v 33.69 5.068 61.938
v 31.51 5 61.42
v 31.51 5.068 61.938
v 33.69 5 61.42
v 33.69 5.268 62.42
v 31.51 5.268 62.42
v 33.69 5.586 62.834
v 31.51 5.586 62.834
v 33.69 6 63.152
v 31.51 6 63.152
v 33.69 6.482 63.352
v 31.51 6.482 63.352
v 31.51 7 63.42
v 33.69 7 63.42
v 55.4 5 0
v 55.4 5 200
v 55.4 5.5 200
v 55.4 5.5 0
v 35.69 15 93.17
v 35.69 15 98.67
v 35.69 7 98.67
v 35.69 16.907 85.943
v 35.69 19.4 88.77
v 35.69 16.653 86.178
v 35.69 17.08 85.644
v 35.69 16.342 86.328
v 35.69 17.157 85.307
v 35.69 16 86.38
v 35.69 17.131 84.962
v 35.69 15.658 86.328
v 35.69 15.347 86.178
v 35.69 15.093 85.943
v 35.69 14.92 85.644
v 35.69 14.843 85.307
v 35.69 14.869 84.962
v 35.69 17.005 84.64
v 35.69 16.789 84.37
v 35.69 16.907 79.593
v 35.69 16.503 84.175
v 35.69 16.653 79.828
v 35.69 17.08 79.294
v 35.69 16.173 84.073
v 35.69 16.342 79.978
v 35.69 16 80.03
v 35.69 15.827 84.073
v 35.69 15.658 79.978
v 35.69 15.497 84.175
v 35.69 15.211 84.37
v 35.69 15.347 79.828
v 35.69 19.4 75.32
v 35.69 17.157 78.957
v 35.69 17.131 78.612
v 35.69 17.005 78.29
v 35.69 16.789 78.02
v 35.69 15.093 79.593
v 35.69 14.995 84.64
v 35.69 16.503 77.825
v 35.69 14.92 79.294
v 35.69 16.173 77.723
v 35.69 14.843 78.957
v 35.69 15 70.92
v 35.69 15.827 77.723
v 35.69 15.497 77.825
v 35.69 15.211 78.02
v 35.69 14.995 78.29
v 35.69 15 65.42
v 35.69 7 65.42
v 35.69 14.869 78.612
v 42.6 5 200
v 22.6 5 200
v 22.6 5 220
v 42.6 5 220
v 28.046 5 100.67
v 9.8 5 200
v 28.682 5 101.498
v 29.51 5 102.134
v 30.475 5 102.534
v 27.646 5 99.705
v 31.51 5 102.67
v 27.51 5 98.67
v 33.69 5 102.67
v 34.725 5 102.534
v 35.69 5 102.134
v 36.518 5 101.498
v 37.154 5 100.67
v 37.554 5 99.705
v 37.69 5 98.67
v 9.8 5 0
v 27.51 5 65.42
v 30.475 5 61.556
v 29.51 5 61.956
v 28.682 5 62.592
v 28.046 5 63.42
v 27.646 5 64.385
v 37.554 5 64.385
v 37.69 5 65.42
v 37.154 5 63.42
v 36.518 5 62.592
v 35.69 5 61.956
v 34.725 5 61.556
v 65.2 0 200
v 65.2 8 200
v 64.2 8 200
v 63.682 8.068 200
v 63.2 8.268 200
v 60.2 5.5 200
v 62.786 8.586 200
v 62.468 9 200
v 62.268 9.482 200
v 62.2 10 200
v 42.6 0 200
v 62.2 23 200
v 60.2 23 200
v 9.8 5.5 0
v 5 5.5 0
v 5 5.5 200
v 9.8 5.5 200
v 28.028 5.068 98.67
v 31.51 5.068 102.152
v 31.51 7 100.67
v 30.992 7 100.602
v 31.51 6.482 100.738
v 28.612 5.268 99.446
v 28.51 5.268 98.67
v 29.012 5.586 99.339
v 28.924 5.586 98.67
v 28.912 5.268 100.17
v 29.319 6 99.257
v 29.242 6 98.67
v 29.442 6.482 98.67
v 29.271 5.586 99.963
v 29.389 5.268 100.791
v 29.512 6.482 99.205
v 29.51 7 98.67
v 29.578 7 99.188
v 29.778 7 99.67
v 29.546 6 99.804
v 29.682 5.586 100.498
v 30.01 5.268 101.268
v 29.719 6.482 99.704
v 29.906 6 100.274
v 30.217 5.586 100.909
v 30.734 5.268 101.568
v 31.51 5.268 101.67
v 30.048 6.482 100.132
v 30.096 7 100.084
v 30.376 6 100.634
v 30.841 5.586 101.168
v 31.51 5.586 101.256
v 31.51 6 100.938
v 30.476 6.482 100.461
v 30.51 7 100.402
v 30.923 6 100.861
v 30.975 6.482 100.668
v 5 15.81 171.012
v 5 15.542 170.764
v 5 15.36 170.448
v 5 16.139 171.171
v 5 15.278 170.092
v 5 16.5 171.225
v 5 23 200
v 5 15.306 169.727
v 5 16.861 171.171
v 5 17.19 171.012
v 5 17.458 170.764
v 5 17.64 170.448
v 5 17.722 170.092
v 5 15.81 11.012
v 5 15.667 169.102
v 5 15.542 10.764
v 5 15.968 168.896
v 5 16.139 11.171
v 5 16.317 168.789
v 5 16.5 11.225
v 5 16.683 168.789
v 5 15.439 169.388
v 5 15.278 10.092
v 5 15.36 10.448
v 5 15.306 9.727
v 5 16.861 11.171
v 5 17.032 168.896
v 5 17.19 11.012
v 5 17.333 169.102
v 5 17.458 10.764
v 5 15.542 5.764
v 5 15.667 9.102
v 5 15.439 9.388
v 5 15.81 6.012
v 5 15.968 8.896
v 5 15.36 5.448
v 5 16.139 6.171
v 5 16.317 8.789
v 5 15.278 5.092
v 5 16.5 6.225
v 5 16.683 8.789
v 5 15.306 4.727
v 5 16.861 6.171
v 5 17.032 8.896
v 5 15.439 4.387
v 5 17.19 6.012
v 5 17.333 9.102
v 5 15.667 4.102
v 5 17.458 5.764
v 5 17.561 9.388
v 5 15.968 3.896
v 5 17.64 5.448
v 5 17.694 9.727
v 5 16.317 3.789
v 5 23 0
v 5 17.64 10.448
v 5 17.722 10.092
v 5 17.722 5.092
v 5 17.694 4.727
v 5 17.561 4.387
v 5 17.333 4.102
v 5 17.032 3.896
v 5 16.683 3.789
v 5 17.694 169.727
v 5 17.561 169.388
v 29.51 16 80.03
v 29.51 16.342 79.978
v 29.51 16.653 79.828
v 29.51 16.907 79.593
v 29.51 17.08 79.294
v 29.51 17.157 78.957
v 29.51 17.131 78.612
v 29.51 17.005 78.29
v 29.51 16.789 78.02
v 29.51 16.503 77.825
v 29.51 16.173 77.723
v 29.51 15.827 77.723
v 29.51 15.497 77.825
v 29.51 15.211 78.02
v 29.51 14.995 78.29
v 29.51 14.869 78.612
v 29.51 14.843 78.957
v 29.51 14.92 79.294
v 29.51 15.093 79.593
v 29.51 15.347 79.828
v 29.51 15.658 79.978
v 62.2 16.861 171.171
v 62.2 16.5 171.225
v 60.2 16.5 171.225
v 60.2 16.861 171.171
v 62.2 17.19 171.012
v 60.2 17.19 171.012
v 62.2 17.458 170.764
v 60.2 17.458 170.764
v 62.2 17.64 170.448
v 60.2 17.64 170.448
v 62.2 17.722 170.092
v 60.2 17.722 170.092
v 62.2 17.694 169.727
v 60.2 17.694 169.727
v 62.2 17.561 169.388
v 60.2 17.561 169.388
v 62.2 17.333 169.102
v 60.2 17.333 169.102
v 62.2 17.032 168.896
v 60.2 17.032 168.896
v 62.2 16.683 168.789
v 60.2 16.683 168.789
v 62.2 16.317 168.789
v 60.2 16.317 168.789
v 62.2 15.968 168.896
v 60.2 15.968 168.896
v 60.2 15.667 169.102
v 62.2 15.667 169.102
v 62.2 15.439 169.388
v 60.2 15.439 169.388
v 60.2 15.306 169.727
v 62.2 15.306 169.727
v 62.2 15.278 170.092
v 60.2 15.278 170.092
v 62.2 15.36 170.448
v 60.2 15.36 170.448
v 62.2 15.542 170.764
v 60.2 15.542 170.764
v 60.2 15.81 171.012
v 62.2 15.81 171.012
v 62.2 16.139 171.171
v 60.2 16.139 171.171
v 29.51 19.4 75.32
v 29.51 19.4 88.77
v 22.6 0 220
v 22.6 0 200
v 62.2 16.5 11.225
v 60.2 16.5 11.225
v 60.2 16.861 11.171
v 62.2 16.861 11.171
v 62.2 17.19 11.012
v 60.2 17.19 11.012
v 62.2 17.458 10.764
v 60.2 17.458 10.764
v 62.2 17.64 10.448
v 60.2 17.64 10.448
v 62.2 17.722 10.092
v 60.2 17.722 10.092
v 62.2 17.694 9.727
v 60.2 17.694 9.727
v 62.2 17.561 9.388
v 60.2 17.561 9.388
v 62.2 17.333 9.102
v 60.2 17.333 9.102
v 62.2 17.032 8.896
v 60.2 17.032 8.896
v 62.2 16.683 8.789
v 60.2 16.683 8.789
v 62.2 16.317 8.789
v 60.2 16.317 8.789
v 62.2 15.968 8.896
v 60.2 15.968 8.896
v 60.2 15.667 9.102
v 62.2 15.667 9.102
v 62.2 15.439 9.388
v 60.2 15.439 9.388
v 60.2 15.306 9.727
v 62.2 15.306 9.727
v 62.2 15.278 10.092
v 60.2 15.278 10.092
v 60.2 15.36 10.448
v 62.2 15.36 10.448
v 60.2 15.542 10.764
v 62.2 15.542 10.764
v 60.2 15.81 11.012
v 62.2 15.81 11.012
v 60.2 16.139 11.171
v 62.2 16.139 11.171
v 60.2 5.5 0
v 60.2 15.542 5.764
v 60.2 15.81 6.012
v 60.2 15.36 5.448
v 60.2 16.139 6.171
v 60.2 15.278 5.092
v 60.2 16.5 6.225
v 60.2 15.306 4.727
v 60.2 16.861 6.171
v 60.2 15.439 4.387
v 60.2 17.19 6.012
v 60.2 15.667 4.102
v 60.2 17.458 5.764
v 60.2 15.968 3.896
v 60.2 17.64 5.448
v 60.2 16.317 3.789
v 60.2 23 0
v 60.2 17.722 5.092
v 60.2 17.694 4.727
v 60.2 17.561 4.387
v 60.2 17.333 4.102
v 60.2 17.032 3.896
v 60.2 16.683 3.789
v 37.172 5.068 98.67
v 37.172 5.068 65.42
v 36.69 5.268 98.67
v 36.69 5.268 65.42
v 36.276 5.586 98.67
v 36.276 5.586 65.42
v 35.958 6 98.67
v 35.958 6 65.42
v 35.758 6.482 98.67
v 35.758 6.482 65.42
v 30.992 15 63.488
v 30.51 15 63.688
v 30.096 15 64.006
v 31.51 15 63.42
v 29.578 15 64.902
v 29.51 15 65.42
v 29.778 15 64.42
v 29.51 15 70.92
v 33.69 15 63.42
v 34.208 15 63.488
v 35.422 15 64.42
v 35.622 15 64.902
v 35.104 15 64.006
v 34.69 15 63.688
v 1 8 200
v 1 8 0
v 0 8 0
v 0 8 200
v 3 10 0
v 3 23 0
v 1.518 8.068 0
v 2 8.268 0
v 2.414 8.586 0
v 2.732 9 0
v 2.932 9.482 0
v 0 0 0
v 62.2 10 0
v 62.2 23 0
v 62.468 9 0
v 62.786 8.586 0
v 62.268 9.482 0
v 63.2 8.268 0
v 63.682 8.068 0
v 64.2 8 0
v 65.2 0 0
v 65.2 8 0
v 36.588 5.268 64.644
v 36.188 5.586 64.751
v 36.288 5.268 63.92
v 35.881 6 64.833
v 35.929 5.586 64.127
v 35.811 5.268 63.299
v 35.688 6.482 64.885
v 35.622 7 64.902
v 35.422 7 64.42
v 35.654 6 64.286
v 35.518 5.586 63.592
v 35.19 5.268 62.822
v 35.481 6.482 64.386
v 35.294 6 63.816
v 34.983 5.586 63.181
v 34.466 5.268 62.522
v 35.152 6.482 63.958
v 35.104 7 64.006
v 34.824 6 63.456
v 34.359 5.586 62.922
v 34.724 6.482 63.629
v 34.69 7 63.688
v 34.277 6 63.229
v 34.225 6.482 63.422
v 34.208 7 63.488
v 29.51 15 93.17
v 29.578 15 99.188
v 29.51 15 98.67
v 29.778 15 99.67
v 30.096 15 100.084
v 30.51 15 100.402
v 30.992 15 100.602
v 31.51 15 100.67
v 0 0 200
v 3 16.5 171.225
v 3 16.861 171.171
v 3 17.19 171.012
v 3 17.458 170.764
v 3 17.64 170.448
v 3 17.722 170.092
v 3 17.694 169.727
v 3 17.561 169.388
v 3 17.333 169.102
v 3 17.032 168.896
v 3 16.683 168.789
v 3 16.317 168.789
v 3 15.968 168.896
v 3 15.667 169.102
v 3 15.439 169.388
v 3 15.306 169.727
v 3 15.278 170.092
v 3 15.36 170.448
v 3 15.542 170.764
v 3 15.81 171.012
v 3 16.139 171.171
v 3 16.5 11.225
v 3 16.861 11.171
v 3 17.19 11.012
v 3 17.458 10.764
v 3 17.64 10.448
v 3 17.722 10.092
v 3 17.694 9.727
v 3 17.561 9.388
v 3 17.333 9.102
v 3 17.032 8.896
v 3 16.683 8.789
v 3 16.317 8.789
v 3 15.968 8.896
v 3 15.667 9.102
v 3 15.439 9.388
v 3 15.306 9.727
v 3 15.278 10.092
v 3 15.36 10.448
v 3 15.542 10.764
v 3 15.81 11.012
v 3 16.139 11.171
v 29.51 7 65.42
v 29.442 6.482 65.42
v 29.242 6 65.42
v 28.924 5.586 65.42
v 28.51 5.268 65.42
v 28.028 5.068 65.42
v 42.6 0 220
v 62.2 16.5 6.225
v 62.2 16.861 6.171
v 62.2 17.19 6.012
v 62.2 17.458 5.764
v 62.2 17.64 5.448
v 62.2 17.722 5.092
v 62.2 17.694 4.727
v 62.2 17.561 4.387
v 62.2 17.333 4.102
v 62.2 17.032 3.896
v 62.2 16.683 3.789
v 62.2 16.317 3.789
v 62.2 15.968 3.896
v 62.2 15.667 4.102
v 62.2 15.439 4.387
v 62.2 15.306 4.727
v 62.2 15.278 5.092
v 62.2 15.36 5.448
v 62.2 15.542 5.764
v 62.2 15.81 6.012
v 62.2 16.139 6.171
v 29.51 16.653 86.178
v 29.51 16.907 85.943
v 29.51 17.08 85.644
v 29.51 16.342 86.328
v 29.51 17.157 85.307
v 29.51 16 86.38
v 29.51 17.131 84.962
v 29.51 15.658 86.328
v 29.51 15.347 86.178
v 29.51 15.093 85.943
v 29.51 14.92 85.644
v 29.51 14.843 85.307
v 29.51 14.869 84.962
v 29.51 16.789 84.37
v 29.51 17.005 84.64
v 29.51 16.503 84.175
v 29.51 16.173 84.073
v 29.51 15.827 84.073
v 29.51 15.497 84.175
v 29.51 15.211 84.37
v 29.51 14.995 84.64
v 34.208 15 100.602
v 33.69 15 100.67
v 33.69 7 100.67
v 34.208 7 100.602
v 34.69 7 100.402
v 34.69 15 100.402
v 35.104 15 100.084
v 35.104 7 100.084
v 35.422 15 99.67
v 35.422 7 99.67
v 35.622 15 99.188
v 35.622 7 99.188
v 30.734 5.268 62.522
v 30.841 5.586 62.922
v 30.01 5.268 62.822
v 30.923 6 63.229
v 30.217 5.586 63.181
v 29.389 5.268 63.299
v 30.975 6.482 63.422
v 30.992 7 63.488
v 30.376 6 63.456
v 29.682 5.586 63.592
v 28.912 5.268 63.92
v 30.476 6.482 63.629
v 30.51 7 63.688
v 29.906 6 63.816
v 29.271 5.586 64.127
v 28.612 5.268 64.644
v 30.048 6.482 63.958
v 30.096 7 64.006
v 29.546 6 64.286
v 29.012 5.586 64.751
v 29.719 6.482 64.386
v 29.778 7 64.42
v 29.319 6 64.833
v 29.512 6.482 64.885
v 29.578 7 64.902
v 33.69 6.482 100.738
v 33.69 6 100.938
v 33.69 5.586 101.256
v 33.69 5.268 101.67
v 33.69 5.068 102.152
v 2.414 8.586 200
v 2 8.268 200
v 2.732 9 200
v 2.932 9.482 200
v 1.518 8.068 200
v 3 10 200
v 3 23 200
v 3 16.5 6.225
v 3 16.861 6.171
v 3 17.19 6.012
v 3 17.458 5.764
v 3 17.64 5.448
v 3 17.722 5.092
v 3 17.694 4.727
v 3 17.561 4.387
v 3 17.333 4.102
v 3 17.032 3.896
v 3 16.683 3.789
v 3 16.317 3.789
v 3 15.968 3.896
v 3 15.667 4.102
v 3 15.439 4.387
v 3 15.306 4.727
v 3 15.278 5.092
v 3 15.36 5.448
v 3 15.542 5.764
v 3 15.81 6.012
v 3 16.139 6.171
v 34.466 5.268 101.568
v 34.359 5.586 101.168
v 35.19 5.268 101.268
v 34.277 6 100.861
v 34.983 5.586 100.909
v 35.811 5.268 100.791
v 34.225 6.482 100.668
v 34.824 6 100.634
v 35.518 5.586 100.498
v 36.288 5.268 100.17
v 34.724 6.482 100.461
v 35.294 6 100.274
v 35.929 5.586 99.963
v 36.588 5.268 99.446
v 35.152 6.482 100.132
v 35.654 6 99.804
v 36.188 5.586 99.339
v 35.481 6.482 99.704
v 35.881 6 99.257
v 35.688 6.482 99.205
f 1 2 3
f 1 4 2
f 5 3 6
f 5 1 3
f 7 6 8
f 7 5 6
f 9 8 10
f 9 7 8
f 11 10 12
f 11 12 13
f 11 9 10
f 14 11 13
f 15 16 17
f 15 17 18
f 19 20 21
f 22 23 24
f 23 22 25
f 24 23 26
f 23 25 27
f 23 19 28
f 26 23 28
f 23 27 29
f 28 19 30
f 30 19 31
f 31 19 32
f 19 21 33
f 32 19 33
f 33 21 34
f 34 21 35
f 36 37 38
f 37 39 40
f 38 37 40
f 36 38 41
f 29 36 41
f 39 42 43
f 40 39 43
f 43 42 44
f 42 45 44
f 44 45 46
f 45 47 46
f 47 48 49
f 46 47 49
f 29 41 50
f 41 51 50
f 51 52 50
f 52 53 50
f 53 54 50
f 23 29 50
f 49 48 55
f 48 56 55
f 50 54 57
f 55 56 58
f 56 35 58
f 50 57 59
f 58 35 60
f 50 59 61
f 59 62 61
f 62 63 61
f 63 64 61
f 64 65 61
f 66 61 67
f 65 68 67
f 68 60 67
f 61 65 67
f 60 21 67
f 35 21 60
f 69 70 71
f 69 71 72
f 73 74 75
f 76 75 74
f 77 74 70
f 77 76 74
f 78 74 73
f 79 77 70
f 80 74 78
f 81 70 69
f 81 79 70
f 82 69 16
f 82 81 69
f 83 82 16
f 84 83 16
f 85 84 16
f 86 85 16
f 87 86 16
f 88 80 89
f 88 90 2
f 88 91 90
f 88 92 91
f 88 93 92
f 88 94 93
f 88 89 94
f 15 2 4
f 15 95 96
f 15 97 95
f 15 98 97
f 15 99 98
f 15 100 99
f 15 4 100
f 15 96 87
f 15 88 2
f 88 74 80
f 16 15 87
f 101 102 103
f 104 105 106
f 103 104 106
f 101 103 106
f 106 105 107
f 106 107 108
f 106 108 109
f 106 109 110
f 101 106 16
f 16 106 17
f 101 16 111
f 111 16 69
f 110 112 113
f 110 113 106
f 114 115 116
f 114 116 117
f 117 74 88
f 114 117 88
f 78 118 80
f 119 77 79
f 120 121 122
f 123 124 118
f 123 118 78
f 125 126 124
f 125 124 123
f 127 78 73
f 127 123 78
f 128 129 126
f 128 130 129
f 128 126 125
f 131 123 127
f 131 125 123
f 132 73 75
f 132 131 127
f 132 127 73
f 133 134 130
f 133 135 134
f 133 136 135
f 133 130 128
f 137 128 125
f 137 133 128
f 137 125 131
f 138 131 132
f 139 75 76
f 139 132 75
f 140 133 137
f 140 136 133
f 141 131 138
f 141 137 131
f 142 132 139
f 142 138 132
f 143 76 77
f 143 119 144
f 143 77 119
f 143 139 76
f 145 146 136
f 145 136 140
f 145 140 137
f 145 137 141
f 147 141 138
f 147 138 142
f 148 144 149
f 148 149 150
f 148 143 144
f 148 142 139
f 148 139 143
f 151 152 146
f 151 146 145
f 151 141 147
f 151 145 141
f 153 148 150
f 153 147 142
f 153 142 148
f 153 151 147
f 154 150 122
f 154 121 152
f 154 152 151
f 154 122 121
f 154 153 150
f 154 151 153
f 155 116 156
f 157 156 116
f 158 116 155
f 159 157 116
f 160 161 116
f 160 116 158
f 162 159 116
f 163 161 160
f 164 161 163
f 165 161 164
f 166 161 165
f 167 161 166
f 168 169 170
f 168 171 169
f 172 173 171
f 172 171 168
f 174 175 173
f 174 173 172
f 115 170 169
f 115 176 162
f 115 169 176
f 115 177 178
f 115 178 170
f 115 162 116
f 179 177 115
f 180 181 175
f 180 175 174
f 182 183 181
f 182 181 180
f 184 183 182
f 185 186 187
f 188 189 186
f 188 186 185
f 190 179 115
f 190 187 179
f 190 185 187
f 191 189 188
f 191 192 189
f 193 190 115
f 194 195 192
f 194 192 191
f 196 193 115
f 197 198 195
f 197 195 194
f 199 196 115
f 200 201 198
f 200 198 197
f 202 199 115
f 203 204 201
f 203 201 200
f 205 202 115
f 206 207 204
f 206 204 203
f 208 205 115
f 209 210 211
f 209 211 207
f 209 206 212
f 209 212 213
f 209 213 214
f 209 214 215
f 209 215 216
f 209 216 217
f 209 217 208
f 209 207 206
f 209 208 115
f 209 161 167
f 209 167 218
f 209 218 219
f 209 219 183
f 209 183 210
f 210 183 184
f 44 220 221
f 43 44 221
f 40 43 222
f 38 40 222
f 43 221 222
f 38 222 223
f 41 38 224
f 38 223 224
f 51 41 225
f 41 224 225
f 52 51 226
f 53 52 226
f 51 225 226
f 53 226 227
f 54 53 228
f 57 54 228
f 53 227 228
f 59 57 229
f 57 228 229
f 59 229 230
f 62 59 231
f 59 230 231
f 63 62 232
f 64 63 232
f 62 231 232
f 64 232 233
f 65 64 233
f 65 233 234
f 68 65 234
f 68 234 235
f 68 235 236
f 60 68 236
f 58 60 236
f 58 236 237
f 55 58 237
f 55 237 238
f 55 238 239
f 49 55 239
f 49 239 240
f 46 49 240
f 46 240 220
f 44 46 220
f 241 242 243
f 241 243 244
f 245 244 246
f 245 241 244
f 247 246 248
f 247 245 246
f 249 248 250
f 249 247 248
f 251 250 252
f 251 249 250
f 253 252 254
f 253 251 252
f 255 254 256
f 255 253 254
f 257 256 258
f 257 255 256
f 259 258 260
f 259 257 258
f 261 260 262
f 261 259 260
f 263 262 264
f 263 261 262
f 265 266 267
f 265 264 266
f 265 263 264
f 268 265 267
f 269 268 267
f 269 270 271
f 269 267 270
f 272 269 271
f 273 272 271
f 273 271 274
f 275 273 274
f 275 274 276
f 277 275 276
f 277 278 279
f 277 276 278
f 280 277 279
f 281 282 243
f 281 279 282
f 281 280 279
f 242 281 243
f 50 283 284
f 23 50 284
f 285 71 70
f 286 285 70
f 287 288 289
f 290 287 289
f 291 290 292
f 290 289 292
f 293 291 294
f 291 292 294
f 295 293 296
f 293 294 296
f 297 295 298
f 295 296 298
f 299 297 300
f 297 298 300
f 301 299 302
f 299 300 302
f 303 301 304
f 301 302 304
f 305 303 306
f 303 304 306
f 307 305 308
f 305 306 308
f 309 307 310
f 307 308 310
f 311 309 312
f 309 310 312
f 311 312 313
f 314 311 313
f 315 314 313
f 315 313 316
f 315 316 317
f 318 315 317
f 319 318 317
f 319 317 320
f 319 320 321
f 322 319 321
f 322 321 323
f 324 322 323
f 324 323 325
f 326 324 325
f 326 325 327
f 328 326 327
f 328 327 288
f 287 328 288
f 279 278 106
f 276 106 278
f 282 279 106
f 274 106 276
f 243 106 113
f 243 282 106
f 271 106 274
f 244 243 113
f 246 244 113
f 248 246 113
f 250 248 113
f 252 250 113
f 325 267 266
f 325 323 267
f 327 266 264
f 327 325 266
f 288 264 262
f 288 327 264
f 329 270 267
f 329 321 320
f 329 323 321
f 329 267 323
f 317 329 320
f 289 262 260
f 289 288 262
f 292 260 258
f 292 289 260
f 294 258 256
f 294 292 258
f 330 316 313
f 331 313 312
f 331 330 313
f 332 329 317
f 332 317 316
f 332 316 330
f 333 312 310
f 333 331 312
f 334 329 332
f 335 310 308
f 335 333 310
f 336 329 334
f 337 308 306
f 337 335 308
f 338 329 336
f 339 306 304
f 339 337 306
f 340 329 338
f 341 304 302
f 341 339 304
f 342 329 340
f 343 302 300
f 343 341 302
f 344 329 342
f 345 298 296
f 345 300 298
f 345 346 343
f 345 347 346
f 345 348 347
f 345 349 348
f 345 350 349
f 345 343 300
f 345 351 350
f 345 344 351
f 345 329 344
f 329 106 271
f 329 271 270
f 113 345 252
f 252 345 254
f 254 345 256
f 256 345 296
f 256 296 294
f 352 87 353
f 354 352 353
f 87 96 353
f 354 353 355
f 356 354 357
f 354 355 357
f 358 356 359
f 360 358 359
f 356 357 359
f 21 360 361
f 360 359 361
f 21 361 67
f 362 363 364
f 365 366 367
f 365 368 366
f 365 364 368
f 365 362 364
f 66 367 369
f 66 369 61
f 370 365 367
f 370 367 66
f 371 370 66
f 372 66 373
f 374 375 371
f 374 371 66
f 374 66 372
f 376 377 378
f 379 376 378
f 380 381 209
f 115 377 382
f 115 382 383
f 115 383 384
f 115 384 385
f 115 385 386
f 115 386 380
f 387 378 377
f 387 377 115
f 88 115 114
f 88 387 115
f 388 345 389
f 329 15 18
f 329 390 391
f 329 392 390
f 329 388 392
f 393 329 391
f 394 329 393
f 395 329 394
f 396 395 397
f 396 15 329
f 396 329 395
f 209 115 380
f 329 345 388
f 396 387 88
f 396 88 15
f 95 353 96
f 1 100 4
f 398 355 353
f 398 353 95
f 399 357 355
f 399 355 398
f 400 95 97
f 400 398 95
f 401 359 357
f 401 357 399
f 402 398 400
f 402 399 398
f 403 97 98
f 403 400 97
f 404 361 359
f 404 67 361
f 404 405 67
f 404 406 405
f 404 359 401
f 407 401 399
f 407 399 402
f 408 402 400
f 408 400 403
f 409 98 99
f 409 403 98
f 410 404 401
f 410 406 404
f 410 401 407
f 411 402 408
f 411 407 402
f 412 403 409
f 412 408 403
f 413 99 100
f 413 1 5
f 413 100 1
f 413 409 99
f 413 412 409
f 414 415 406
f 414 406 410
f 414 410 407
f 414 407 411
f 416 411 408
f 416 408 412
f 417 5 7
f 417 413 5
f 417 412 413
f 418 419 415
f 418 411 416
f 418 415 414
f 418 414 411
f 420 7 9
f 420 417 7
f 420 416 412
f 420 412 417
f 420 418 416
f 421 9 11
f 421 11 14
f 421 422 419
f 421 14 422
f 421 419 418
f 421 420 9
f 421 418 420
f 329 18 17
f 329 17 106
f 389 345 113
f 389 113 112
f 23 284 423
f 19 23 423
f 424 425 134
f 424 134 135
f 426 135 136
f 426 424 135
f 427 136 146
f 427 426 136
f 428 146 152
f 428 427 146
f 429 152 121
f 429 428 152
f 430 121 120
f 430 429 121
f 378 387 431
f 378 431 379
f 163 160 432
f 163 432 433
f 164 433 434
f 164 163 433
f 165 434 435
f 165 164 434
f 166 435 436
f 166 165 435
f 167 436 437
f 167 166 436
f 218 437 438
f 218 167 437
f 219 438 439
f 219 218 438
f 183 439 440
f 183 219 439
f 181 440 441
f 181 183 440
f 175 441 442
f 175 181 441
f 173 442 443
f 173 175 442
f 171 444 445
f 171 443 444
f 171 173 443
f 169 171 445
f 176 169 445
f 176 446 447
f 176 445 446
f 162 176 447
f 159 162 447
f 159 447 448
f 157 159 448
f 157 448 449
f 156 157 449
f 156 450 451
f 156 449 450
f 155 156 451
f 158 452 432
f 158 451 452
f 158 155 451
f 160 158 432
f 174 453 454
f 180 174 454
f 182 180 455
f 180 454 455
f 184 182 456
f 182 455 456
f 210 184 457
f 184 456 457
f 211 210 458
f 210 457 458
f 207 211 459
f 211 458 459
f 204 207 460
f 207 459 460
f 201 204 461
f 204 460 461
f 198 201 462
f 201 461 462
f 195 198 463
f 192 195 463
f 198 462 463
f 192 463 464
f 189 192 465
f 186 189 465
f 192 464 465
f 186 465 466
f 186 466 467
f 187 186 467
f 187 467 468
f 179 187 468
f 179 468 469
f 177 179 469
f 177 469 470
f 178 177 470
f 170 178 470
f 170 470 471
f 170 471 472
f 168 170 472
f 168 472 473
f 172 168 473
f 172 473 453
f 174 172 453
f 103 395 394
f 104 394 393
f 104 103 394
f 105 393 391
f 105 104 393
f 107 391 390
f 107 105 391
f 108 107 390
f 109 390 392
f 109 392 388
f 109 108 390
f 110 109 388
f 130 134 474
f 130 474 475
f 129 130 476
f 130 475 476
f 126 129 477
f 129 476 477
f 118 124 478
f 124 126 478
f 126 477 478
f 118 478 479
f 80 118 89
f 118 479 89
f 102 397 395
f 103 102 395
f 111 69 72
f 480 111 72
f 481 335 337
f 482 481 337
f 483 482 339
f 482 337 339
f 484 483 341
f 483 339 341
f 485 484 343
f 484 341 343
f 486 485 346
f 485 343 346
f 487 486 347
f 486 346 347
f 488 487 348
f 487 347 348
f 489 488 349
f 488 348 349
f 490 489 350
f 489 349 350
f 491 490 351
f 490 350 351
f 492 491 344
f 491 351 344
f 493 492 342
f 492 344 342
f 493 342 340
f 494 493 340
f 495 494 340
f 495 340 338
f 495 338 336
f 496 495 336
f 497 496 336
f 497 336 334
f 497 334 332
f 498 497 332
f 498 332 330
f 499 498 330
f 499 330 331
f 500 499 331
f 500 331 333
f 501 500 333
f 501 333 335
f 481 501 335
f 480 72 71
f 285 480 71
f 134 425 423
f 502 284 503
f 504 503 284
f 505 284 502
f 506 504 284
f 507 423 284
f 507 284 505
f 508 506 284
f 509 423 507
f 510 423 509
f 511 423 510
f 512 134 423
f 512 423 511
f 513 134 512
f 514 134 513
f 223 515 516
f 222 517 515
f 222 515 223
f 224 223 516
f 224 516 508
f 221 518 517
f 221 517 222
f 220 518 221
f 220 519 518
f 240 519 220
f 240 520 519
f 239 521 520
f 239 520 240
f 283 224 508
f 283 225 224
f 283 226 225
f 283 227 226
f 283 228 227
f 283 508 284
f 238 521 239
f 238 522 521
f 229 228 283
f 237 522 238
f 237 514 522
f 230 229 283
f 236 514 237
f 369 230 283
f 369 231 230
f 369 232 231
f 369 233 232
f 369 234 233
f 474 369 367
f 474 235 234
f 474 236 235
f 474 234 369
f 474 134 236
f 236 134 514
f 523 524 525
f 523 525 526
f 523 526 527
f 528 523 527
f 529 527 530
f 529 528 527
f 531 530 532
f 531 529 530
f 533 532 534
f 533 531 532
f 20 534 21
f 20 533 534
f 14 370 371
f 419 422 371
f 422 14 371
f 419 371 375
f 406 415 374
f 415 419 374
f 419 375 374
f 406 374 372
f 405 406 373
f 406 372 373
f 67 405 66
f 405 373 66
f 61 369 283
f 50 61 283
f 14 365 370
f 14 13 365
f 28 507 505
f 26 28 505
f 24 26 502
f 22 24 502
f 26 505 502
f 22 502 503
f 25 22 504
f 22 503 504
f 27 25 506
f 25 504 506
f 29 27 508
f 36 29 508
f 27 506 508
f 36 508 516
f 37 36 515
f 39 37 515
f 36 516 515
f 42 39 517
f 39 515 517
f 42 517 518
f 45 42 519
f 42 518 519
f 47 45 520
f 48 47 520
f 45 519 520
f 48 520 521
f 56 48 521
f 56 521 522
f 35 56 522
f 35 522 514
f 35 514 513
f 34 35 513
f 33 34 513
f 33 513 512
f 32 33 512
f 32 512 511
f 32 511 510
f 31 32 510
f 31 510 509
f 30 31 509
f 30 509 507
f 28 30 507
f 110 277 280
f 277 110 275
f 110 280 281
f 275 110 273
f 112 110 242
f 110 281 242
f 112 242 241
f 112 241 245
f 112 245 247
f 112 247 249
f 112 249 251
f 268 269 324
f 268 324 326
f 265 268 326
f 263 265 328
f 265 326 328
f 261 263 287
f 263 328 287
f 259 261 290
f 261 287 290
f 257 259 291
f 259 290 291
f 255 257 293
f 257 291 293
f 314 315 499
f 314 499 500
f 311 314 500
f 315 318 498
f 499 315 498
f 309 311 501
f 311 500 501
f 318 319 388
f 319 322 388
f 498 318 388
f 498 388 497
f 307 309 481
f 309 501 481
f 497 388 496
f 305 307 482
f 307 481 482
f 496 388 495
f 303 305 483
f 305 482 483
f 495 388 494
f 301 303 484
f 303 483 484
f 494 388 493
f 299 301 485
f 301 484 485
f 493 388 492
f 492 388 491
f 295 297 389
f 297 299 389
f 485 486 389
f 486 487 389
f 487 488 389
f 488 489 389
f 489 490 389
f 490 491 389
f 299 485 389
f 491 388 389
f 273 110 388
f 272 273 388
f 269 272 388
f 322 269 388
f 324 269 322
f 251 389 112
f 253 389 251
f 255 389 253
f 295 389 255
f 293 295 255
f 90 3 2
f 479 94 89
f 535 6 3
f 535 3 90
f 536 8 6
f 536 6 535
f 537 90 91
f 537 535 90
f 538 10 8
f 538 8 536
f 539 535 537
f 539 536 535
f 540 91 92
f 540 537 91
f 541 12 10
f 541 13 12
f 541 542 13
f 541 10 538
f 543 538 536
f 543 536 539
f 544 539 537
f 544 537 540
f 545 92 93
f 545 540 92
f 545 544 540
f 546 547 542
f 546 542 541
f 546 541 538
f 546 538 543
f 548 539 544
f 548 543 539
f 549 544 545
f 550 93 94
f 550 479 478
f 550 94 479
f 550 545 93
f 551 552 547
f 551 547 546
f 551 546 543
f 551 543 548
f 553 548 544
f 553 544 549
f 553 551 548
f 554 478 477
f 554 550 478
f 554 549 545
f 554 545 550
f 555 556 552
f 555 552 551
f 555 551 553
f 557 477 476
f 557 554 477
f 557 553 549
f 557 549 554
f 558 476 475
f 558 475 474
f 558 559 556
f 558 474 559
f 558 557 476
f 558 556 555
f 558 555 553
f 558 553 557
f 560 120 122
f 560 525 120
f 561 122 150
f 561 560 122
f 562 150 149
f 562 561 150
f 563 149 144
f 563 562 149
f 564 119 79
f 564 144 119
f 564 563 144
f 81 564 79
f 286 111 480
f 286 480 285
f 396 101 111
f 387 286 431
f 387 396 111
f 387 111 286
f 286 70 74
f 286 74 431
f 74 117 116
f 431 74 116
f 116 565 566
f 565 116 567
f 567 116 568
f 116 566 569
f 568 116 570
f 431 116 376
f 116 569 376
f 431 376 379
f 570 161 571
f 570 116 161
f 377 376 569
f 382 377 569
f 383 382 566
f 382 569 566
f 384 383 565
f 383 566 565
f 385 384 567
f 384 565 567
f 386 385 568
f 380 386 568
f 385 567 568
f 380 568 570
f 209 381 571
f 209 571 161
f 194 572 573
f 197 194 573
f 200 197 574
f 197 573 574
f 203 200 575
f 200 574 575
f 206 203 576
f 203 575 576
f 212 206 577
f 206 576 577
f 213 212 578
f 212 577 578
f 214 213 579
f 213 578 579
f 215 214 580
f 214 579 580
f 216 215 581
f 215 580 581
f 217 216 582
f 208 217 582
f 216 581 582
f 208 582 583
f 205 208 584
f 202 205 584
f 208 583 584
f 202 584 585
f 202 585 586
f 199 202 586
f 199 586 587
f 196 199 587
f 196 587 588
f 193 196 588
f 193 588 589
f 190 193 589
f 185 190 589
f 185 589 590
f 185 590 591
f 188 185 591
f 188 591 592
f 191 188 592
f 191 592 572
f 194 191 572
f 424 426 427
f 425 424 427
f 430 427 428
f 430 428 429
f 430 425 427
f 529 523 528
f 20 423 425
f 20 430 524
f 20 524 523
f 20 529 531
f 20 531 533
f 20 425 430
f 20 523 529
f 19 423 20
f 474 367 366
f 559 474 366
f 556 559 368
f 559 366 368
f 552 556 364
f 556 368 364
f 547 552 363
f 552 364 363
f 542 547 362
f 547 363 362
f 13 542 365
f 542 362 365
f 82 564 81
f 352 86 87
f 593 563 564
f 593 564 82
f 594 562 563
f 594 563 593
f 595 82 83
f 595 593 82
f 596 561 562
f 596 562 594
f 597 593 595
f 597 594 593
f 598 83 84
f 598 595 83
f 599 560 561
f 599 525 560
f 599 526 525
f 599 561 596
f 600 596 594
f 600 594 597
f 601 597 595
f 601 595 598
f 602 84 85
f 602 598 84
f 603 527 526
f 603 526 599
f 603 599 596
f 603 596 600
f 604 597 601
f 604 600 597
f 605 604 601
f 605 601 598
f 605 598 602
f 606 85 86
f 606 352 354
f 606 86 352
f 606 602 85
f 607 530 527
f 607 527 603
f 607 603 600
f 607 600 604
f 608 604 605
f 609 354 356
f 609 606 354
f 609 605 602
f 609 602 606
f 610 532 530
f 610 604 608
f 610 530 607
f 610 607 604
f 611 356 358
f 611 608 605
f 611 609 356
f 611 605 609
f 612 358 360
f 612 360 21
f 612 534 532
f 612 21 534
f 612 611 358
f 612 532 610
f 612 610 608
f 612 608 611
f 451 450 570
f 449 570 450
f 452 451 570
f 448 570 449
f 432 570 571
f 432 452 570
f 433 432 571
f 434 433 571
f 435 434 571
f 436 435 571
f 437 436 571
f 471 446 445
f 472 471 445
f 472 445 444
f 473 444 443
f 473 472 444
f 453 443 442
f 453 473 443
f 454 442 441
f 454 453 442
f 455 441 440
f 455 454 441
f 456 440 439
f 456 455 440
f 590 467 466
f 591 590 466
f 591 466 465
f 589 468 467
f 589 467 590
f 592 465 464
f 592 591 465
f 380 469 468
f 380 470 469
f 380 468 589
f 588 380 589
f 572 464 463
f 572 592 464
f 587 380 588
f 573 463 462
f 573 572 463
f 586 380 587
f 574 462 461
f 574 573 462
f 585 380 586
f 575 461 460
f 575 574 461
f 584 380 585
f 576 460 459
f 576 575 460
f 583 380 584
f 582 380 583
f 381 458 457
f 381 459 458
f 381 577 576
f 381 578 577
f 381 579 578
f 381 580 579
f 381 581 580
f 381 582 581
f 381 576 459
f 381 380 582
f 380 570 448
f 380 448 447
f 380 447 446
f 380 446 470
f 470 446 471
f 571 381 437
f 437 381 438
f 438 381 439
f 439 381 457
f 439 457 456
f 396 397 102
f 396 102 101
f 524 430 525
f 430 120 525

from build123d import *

# Parameters (mm, degrees)
BOSS_EXTRUDE1_DEPTH      = 400
SKETCH2_R                = 2.1
CUT_EXTRUDE3_DEPTH       = 10
SKETCH3_W                = 158.039132068
SKETCH3_H                = 497.98789011
CUT_EXTRUDE4_DEPTH       = 2
SKETCH4_W                = 4.8
SKETCH4_H                = 400
BOSS_EXTRUDE2_DEPTH      = 8
SKETCH5_R                = 1.2
CUT_EXTRUDE9_DEPTH       = 406.158043237
SKETCH9_R                = 1.225
CUT_EXTRUDE10_DEPTH      = 406.931077894
SKETCH10_W               = 4.8
SKETCH10_H               = 400
CUT_EXTRUDE11_DEPTH      = 5
BOSS_EXTRUDE3_START      = -15
SKETCH12_R               = 2.1
BOSS_EXTRUDE3_DEPTH      = 15
SKETCH13_W               = 6.18
SKETCH13_H               = 37.25
BOSS_EXTRUDE5_DEPTH      = 10
BOSS_EXTRUDE6_DEPTH      = 6.18
SKETCH15_R               = 1.05
CUT_EXTRUDE12_DEPTH      = 10
FILLET1_R                = 2
SKETCH16_W               = 4.8
SKETCH16_H               = 400
CUT_EXTRUDE13_DEPTH      = 2.5
CUT_EXTRUDE14_REACH      = 404.247
SKETCH17_R               = 1.16
CUT_EXTRUDE16_DEPTH      = 406.158043237
CUT_EXTRUDE16_DEPTH_BACK = 406.158043237
SKETCH18_R               = 1.225
CUT_EXTRUDE17_DEPTH      = 406.158043237
CUT_EXTRUDE17_DEPTH_BACK = 406.158043237
SKETCH20_R               = 1.225
SKETCH22_W               = 3
SKETCH22_H               = 15
CUT_EXTRUDE18_DEPTH      = 406.931077894
FILLET2_R                = 2
FILLET3_R                = 2
SKETCH24_W               = 3
SKETCH24_H               = 200
SKETCH24_W_2             = 2
CUT_EXTRUDE20_DEPTH      = 406.931077894


with BuildPart() as part:
    # Sketch1 → Boss-Extrude1 (new body)
    with BuildSketch(Plane.XY):
        Polygon((0, 0), (0, 25), (5, 25), (5, 5), (60.2, 5), (60.2, 25), (65.2, 25), (65.2, 0), align=None)
    extrude(amount=BOSS_EXTRUDE1_DEPTH)

    # Sketch2 → Cut-Extrude3 (cut)
    with BuildSketch(Plane(origin=(0, 5, 0), x_dir=(1, 0, 0), z_dir=(0, 1, 0))):
        with Locations(Location((32.6, -67.17, 0), (0, 0, 270))):
            Circle(SKETCH2_R)
        with Locations(Location((32.6, -96.92, 0), (0, 0, 270))):
            Circle(SKETCH2_R)
    extrude(amount=-CUT_EXTRUDE3_DEPTH, mode=Mode.SUBTRACT)

    # Sketch3 → Cut-Extrude4 (cut)
    with BuildSketch(Plane(origin=(0, 25, 0), x_dir=(1, 0, 0), z_dir=(0, 1, 0))):
        with Locations((44.123686713, -201.646240959)):
            Rectangle(SKETCH3_W, SKETCH3_H)
    extrude(amount=-CUT_EXTRUDE4_DEPTH, mode=Mode.SUBTRACT)

    # Sketch4 → Boss-Extrude2 (add)
    with BuildSketch(Plane(origin=(0, 5, 0), x_dir=(1, 0, 0), z_dir=(0, 1, 0))):
        with Locations((7.4, -200)):
            Rectangle(SKETCH4_W, SKETCH4_H)
        with Locations((57.8, -200)):
            Rectangle(SKETCH4_W, SKETCH4_H)
    extrude(amount=BOSS_EXTRUDE2_DEPTH)

    # Sketch5 → Cut-Extrude9 (cut, through all)
    with BuildSketch(Plane(origin=(5, 0, 0), x_dir=(0, 0, -1), z_dir=(1, 0, 0))):
        with Locations(Location((-395, 16.5, 0), (0, 0, 90))):
            Circle(SKETCH5_R)
        with Locations(Location((-390, 16.5, 0), (0, 0, 90))):
            Circle(SKETCH5_R)
        with Locations(Location((-10, 16.5, 0), (0, 0, 90))):
            Circle(SKETCH5_R)
        with Locations(Location((-5, 16.5, 0), (0, 0, 90))):
            Circle(SKETCH5_R)
    extrude(amount=-CUT_EXTRUDE9_DEPTH, mode=Mode.SUBTRACT)

    # Sketch9 → Cut-Extrude10 (cut, through all)
    with BuildSketch(Plane.ZY):
        with Locations((5, 16.5)):
            Circle(SKETCH9_R)
        with Locations((10, 16.5)):
            Circle(SKETCH9_R)
        with Locations((390, 16.5)):
            Circle(SKETCH9_R)
        with Locations((395, 16.5)):
            Circle(SKETCH9_R)
    extrude(amount=-CUT_EXTRUDE10_DEPTH, mode=Mode.SUBTRACT)

    # Sketch10 → Cut-Extrude11 (cut)
    with BuildSketch(Plane(origin=(0, 13, 0), x_dir=(1, 0, 0), z_dir=(0, 1, 0))):
        with Locations((7.4, -200)):
            Rectangle(SKETCH10_W, SKETCH10_H)
        with Locations((57.8, -200)):
            Rectangle(SKETCH10_W, SKETCH10_H)
    extrude(amount=-CUT_EXTRUDE11_DEPTH, mode=Mode.SUBTRACT)

    # Sketch12 → Boss-Extrude3 (add)
    with BuildSketch(Plane.XZ.offset(BOSS_EXTRUDE3_START)):
        with Locations(Location((32.6, 96.92, 0), (0, 0, 270))):
            Circle(SKETCH12_R)
        with Locations(Location((32.6, 67.17, 0), (0, 0, 270))):
            Circle(SKETCH12_R)
    extrude(amount=BOSS_EXTRUDE3_DEPTH)

    # Sketch13 → Boss-Extrude5 (add)
    with BuildSketch(Plane(origin=(0, 5, 0), x_dir=(1, 0, 0), z_dir=(0, 1, 0))):
        with Locations((32.6, -82.045)):
            Rectangle(SKETCH13_W, SKETCH13_H)
    extrude(amount=BOSS_EXTRUDE5_DEPTH)

    # Sketch14 → Boss-Extrude6 (add)
    with BuildSketch(Plane.ZY.offset(-29.51)):
        Polygon((70.92, 15), (75.32, 19.4), (88.77, 19.4), (93.17, 15), align=None)
    extrude(amount=-BOSS_EXTRUDE6_DEPTH)

    # Sketch15 → Cut-Extrude12 (cut)
    with BuildSketch(Plane.ZY.offset(-29.51)):
        with Locations((78.87, 16)):
            Circle(SKETCH15_R)
        with Locations((85.22, 16)):
            Circle(SKETCH15_R)
    extrude(amount=-CUT_EXTRUDE12_DEPTH, mode=Mode.SUBTRACT)

    # Fillet1
    fillet1_edges = [part.edges().sort_by_distance(p)[0] for p in [
        (29.51, 5, 82.045),
        (29.51, 10, 63.42),
        (32.6, 5, 100.67),
        (29.51, 10, 100.67),
        (35.69, 5, 82.045),
        (35.69, 10, 100.67),
        (32.6, 5, 63.42),
        (35.69, 10, 63.42),
    ]]
    fillet(fillet1_edges, radius=FILLET1_R)

    # Sketch16 → Cut-Extrude13 (cut)
    with BuildSketch(Plane(origin=(0, 8, 0), x_dir=(1, 0, 0), z_dir=(0, 1, 0))):
        with Locations((7.4, -200)):
            Rectangle(SKETCH16_W, SKETCH16_H)
        with Locations((57.8, -200)):
            Rectangle(SKETCH16_W, SKETCH16_H)
    extrude(amount=-CUT_EXTRUDE13_DEPTH, mode=Mode.SUBTRACT)

    # Sketch17 → Cut-Extrude14 (cut, up to next)
    with BuildSketch(Plane.ZY.offset(-29.51), mode=Mode.PRIVATE) as cut_extrude14_sk1:
        with Locations((78.87, 16)):
            Circle(SKETCH17_R)
    cut_extrude14_tool1 = extrude(cut_extrude14_sk1.sketch, amount=-CUT_EXTRUDE14_REACH, mode=Mode.PRIVATE) & part.part
    # Sketch17 → Cut-Extrude14 (cut, up to next)
    with BuildSketch(Plane.ZY.offset(-29.51), mode=Mode.PRIVATE) as cut_extrude14_sk2:
        with Locations((85.22, 16)):
            Circle(SKETCH17_R)
    cut_extrude14_tool2 = extrude(cut_extrude14_sk2.sketch, amount=-CUT_EXTRUDE14_REACH, mode=Mode.PRIVATE) & part.part
    add(cut_extrude14_tool1.solids().sort_by_distance((29.51, 16, 78.87))[0], mode=Mode.SUBTRACT)
    add(cut_extrude14_tool2.solids().sort_by_distance((29.51, 16, 85.22))[0], mode=Mode.SUBTRACT)

    # Sketch18 → Cut-Extrude16 (cut, two sides: drawn at the far end of the back side and taken through both)
    with BuildSketch(Plane.ZY.offset(-60.2).offset(-CUT_EXTRUDE16_DEPTH_BACK)):
        with Locations((170, 16.5)):
            Circle(SKETCH18_R)
    extrude(amount=CUT_EXTRUDE16_DEPTH + CUT_EXTRUDE16_DEPTH_BACK, mode=Mode.SUBTRACT)

    # Sketch20 → Cut-Extrude17 (cut, two sides: drawn at the far end of the back side and taken through both)
    with BuildSketch(Plane.ZY.offset(-60.2).offset(-CUT_EXTRUDE17_DEPTH_BACK)):
        with Locations((230, 16.5)):
            Circle(SKETCH20_R)
    extrude(amount=CUT_EXTRUDE17_DEPTH + CUT_EXTRUDE17_DEPTH_BACK, mode=Mode.SUBTRACT)

    # Sketch22 → Cut-Extrude18 (cut, through all)
    with BuildSketch(Plane(origin=(0, 0, 0), x_dir=(-1, 0, 0), z_dir=(0, 0, -1))):
        with Locations((-63.7, 15.5)):
            Rectangle(SKETCH22_W, SKETCH22_H)
        with Locations((-1.5, 15.5)):
            Rectangle(SKETCH22_W, SKETCH22_H)
    extrude(amount=-CUT_EXTRUDE18_DEPTH, mode=Mode.SUBTRACT)

    # Fillet2
    fillet2_edges = [part.edges().sort_by_distance(p)[0] for p in [
        (62.2, 8, 200),
    ]]
    fillet(fillet2_edges, radius=FILLET2_R)

    # Fillet3
    fillet3_edges = [part.edges().sort_by_distance(p)[0] for p in [
        (3, 8, 200),
    ]]
    fillet(fillet3_edges, radius=FILLET3_R)

    # Sketch24 → Cut-Extrude20 (cut, through all)
    with BuildSketch(Plane(origin=(0, 23, 0), x_dir=(1, 0, 0), z_dir=(0, 1, 0))):
        Polygon((22.6, -200), (0, -200), (0, -400), (60.2, -400), (60.2, -200), (42.6, -200), (42.6, -220), (22.6, -220), align=None)
        with Locations((63.7, -300)):
            Rectangle(SKETCH24_W, SKETCH24_H)
        with Locations((61.2, -300)):
            Rectangle(SKETCH24_W_2, SKETCH24_H)
    extrude(amount=-CUT_EXTRUDE20_DEPTH, mode=Mode.SUBTRACT)


solid = part.part
